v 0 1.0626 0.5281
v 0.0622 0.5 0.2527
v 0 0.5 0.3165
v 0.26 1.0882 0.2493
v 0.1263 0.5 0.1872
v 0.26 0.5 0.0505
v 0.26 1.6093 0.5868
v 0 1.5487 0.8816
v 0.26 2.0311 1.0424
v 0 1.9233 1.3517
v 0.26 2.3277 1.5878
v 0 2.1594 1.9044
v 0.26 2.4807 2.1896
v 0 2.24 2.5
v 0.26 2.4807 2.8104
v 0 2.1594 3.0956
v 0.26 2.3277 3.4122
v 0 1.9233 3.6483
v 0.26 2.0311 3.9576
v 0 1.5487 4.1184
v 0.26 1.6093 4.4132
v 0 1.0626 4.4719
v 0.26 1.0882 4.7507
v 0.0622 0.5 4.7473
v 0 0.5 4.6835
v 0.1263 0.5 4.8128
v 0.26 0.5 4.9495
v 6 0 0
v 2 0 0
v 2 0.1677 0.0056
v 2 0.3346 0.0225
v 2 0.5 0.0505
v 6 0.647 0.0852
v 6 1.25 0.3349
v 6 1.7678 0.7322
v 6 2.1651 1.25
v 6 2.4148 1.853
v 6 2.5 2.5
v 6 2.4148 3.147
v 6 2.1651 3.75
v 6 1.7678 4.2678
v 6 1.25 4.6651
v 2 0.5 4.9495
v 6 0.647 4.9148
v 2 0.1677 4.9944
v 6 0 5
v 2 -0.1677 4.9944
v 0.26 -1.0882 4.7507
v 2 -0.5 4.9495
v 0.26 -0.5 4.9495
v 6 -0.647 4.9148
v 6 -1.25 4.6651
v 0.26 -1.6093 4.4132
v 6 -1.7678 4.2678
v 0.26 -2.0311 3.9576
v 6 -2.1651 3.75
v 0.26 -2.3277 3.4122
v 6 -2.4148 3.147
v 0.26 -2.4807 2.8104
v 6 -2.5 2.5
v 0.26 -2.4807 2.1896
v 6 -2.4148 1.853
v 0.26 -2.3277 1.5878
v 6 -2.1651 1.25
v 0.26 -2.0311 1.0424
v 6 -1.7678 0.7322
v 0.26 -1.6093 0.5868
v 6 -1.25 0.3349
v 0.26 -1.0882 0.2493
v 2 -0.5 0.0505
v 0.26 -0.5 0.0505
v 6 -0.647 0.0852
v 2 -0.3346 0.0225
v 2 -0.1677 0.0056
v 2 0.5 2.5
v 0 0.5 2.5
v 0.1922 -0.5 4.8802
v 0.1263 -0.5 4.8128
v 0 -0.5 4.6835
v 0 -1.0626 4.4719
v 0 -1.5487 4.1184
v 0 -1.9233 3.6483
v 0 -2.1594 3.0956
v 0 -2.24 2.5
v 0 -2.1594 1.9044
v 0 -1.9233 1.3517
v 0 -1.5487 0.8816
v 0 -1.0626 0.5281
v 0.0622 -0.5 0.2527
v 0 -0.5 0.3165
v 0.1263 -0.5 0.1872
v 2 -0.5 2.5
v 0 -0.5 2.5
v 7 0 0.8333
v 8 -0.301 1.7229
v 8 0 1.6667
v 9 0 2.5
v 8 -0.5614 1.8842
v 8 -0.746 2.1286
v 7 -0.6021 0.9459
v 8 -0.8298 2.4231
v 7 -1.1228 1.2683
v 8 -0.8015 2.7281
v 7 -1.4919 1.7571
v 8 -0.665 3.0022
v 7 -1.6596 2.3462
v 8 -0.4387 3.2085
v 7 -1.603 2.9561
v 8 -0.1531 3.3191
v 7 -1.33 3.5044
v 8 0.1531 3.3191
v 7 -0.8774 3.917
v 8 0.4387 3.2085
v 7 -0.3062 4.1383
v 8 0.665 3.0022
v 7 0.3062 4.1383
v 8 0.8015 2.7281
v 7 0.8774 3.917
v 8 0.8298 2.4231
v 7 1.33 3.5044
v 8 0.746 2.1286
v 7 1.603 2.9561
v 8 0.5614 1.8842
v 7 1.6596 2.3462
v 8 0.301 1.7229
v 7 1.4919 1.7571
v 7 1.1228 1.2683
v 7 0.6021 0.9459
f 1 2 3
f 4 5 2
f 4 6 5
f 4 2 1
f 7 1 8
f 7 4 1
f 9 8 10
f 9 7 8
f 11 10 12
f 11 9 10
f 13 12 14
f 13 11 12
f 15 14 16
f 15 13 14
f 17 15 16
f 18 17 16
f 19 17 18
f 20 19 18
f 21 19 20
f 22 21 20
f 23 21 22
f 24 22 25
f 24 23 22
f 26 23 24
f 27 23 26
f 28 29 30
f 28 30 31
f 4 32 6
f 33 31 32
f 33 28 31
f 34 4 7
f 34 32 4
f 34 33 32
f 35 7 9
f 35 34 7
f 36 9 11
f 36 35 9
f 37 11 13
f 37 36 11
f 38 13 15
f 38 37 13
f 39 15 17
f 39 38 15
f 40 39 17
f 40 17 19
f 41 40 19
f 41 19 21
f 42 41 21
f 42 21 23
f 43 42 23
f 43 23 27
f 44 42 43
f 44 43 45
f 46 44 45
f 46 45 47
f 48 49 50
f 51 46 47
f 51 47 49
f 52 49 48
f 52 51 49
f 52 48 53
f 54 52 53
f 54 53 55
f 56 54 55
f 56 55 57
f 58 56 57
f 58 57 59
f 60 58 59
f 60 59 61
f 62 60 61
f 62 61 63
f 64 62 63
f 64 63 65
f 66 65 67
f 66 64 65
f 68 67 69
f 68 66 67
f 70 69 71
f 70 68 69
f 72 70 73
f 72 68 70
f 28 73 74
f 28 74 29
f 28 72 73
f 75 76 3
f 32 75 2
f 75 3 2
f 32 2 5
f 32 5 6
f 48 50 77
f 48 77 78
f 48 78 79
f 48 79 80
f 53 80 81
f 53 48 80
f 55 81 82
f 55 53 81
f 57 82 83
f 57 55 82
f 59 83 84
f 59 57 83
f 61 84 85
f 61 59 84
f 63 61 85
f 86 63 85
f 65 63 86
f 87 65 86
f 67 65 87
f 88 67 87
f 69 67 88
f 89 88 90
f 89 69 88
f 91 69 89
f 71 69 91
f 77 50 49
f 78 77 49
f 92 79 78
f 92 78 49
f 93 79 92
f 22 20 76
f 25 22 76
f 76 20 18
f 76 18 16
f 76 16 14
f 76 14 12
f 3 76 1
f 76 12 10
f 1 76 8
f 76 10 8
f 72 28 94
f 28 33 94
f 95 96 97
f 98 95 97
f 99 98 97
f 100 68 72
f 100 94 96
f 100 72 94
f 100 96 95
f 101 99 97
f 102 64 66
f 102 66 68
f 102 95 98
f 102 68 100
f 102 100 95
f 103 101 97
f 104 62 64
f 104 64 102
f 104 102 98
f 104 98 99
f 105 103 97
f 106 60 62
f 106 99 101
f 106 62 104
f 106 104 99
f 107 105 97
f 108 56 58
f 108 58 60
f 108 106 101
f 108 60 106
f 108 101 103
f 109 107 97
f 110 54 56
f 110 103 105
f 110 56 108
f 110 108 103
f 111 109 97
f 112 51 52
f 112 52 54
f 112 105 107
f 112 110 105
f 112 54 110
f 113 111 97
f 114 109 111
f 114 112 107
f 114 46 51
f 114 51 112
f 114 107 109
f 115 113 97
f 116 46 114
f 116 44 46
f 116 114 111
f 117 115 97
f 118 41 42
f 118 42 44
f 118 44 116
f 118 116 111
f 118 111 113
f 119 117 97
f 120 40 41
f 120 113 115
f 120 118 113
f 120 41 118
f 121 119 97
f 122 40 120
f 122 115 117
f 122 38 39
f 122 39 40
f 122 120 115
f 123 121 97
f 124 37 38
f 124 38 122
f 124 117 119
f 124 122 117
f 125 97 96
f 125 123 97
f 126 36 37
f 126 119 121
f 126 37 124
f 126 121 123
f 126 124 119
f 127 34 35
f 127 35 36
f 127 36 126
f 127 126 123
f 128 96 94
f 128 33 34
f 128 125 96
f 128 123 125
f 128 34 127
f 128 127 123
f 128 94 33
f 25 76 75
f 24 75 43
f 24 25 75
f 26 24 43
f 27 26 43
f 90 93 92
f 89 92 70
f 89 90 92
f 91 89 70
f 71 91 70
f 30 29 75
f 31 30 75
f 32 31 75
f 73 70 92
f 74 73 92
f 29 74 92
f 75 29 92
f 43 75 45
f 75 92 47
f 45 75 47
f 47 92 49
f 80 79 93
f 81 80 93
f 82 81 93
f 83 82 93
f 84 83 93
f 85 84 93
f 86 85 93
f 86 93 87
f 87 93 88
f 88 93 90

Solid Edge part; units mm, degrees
sketch "Sketch1" plane through (0, 0, 0) normal (0, -1, 0) x (1, 0, 0)
  line L0 (0, 2) -> (0, 0)
  line L1 (0, 0) -> (6, 0)
  line L2 (9, 2.5) -> (6, 0)
  line L3 (6, 2.5) -> (9, 2.5)
  line L4 (6, 2.5) -> (2, 2.5)
  line L5 (2, 2.5) -> (2, 2)
  line L6 (2, 2) -> (0, 2)
revolve "RevolvedProtrusion1" add sketch "Sketch1" angle 360 about axis through (6, 0, 2.5) along (1, 0, 0)
chamfer "Chanfro_1" distance 0.26 angle 45 1 edges at (0, 0, 5) measured on face at (0, -1.6167, 0.7833)
sketch "Sketch2" plane through (0, 0, 2.5) normal (-1, 0, 0) x (0, -1, 0)
  line L0 (0.5, 2.4495) -> (0.5, 0)
  line L1 (0.5, 0) -> (0.5, -2.4495)
  arc A0 (0.5, -2.4495) -> (-0.5, -2.4495) centre (0, 0) cw
  line L2 (-0.5, 0) -> (-0.5, -2.4495)
  line L3 (-0.5, 0) -> (-0.5, 2.4495)
  arc A1 (-0.5, 2.4495) -> (0.5, 2.4495) centre (0, 0) cw
extrude "Recorte_Extrudado_1" cut sketch "Sketch2" against normal blind 2
